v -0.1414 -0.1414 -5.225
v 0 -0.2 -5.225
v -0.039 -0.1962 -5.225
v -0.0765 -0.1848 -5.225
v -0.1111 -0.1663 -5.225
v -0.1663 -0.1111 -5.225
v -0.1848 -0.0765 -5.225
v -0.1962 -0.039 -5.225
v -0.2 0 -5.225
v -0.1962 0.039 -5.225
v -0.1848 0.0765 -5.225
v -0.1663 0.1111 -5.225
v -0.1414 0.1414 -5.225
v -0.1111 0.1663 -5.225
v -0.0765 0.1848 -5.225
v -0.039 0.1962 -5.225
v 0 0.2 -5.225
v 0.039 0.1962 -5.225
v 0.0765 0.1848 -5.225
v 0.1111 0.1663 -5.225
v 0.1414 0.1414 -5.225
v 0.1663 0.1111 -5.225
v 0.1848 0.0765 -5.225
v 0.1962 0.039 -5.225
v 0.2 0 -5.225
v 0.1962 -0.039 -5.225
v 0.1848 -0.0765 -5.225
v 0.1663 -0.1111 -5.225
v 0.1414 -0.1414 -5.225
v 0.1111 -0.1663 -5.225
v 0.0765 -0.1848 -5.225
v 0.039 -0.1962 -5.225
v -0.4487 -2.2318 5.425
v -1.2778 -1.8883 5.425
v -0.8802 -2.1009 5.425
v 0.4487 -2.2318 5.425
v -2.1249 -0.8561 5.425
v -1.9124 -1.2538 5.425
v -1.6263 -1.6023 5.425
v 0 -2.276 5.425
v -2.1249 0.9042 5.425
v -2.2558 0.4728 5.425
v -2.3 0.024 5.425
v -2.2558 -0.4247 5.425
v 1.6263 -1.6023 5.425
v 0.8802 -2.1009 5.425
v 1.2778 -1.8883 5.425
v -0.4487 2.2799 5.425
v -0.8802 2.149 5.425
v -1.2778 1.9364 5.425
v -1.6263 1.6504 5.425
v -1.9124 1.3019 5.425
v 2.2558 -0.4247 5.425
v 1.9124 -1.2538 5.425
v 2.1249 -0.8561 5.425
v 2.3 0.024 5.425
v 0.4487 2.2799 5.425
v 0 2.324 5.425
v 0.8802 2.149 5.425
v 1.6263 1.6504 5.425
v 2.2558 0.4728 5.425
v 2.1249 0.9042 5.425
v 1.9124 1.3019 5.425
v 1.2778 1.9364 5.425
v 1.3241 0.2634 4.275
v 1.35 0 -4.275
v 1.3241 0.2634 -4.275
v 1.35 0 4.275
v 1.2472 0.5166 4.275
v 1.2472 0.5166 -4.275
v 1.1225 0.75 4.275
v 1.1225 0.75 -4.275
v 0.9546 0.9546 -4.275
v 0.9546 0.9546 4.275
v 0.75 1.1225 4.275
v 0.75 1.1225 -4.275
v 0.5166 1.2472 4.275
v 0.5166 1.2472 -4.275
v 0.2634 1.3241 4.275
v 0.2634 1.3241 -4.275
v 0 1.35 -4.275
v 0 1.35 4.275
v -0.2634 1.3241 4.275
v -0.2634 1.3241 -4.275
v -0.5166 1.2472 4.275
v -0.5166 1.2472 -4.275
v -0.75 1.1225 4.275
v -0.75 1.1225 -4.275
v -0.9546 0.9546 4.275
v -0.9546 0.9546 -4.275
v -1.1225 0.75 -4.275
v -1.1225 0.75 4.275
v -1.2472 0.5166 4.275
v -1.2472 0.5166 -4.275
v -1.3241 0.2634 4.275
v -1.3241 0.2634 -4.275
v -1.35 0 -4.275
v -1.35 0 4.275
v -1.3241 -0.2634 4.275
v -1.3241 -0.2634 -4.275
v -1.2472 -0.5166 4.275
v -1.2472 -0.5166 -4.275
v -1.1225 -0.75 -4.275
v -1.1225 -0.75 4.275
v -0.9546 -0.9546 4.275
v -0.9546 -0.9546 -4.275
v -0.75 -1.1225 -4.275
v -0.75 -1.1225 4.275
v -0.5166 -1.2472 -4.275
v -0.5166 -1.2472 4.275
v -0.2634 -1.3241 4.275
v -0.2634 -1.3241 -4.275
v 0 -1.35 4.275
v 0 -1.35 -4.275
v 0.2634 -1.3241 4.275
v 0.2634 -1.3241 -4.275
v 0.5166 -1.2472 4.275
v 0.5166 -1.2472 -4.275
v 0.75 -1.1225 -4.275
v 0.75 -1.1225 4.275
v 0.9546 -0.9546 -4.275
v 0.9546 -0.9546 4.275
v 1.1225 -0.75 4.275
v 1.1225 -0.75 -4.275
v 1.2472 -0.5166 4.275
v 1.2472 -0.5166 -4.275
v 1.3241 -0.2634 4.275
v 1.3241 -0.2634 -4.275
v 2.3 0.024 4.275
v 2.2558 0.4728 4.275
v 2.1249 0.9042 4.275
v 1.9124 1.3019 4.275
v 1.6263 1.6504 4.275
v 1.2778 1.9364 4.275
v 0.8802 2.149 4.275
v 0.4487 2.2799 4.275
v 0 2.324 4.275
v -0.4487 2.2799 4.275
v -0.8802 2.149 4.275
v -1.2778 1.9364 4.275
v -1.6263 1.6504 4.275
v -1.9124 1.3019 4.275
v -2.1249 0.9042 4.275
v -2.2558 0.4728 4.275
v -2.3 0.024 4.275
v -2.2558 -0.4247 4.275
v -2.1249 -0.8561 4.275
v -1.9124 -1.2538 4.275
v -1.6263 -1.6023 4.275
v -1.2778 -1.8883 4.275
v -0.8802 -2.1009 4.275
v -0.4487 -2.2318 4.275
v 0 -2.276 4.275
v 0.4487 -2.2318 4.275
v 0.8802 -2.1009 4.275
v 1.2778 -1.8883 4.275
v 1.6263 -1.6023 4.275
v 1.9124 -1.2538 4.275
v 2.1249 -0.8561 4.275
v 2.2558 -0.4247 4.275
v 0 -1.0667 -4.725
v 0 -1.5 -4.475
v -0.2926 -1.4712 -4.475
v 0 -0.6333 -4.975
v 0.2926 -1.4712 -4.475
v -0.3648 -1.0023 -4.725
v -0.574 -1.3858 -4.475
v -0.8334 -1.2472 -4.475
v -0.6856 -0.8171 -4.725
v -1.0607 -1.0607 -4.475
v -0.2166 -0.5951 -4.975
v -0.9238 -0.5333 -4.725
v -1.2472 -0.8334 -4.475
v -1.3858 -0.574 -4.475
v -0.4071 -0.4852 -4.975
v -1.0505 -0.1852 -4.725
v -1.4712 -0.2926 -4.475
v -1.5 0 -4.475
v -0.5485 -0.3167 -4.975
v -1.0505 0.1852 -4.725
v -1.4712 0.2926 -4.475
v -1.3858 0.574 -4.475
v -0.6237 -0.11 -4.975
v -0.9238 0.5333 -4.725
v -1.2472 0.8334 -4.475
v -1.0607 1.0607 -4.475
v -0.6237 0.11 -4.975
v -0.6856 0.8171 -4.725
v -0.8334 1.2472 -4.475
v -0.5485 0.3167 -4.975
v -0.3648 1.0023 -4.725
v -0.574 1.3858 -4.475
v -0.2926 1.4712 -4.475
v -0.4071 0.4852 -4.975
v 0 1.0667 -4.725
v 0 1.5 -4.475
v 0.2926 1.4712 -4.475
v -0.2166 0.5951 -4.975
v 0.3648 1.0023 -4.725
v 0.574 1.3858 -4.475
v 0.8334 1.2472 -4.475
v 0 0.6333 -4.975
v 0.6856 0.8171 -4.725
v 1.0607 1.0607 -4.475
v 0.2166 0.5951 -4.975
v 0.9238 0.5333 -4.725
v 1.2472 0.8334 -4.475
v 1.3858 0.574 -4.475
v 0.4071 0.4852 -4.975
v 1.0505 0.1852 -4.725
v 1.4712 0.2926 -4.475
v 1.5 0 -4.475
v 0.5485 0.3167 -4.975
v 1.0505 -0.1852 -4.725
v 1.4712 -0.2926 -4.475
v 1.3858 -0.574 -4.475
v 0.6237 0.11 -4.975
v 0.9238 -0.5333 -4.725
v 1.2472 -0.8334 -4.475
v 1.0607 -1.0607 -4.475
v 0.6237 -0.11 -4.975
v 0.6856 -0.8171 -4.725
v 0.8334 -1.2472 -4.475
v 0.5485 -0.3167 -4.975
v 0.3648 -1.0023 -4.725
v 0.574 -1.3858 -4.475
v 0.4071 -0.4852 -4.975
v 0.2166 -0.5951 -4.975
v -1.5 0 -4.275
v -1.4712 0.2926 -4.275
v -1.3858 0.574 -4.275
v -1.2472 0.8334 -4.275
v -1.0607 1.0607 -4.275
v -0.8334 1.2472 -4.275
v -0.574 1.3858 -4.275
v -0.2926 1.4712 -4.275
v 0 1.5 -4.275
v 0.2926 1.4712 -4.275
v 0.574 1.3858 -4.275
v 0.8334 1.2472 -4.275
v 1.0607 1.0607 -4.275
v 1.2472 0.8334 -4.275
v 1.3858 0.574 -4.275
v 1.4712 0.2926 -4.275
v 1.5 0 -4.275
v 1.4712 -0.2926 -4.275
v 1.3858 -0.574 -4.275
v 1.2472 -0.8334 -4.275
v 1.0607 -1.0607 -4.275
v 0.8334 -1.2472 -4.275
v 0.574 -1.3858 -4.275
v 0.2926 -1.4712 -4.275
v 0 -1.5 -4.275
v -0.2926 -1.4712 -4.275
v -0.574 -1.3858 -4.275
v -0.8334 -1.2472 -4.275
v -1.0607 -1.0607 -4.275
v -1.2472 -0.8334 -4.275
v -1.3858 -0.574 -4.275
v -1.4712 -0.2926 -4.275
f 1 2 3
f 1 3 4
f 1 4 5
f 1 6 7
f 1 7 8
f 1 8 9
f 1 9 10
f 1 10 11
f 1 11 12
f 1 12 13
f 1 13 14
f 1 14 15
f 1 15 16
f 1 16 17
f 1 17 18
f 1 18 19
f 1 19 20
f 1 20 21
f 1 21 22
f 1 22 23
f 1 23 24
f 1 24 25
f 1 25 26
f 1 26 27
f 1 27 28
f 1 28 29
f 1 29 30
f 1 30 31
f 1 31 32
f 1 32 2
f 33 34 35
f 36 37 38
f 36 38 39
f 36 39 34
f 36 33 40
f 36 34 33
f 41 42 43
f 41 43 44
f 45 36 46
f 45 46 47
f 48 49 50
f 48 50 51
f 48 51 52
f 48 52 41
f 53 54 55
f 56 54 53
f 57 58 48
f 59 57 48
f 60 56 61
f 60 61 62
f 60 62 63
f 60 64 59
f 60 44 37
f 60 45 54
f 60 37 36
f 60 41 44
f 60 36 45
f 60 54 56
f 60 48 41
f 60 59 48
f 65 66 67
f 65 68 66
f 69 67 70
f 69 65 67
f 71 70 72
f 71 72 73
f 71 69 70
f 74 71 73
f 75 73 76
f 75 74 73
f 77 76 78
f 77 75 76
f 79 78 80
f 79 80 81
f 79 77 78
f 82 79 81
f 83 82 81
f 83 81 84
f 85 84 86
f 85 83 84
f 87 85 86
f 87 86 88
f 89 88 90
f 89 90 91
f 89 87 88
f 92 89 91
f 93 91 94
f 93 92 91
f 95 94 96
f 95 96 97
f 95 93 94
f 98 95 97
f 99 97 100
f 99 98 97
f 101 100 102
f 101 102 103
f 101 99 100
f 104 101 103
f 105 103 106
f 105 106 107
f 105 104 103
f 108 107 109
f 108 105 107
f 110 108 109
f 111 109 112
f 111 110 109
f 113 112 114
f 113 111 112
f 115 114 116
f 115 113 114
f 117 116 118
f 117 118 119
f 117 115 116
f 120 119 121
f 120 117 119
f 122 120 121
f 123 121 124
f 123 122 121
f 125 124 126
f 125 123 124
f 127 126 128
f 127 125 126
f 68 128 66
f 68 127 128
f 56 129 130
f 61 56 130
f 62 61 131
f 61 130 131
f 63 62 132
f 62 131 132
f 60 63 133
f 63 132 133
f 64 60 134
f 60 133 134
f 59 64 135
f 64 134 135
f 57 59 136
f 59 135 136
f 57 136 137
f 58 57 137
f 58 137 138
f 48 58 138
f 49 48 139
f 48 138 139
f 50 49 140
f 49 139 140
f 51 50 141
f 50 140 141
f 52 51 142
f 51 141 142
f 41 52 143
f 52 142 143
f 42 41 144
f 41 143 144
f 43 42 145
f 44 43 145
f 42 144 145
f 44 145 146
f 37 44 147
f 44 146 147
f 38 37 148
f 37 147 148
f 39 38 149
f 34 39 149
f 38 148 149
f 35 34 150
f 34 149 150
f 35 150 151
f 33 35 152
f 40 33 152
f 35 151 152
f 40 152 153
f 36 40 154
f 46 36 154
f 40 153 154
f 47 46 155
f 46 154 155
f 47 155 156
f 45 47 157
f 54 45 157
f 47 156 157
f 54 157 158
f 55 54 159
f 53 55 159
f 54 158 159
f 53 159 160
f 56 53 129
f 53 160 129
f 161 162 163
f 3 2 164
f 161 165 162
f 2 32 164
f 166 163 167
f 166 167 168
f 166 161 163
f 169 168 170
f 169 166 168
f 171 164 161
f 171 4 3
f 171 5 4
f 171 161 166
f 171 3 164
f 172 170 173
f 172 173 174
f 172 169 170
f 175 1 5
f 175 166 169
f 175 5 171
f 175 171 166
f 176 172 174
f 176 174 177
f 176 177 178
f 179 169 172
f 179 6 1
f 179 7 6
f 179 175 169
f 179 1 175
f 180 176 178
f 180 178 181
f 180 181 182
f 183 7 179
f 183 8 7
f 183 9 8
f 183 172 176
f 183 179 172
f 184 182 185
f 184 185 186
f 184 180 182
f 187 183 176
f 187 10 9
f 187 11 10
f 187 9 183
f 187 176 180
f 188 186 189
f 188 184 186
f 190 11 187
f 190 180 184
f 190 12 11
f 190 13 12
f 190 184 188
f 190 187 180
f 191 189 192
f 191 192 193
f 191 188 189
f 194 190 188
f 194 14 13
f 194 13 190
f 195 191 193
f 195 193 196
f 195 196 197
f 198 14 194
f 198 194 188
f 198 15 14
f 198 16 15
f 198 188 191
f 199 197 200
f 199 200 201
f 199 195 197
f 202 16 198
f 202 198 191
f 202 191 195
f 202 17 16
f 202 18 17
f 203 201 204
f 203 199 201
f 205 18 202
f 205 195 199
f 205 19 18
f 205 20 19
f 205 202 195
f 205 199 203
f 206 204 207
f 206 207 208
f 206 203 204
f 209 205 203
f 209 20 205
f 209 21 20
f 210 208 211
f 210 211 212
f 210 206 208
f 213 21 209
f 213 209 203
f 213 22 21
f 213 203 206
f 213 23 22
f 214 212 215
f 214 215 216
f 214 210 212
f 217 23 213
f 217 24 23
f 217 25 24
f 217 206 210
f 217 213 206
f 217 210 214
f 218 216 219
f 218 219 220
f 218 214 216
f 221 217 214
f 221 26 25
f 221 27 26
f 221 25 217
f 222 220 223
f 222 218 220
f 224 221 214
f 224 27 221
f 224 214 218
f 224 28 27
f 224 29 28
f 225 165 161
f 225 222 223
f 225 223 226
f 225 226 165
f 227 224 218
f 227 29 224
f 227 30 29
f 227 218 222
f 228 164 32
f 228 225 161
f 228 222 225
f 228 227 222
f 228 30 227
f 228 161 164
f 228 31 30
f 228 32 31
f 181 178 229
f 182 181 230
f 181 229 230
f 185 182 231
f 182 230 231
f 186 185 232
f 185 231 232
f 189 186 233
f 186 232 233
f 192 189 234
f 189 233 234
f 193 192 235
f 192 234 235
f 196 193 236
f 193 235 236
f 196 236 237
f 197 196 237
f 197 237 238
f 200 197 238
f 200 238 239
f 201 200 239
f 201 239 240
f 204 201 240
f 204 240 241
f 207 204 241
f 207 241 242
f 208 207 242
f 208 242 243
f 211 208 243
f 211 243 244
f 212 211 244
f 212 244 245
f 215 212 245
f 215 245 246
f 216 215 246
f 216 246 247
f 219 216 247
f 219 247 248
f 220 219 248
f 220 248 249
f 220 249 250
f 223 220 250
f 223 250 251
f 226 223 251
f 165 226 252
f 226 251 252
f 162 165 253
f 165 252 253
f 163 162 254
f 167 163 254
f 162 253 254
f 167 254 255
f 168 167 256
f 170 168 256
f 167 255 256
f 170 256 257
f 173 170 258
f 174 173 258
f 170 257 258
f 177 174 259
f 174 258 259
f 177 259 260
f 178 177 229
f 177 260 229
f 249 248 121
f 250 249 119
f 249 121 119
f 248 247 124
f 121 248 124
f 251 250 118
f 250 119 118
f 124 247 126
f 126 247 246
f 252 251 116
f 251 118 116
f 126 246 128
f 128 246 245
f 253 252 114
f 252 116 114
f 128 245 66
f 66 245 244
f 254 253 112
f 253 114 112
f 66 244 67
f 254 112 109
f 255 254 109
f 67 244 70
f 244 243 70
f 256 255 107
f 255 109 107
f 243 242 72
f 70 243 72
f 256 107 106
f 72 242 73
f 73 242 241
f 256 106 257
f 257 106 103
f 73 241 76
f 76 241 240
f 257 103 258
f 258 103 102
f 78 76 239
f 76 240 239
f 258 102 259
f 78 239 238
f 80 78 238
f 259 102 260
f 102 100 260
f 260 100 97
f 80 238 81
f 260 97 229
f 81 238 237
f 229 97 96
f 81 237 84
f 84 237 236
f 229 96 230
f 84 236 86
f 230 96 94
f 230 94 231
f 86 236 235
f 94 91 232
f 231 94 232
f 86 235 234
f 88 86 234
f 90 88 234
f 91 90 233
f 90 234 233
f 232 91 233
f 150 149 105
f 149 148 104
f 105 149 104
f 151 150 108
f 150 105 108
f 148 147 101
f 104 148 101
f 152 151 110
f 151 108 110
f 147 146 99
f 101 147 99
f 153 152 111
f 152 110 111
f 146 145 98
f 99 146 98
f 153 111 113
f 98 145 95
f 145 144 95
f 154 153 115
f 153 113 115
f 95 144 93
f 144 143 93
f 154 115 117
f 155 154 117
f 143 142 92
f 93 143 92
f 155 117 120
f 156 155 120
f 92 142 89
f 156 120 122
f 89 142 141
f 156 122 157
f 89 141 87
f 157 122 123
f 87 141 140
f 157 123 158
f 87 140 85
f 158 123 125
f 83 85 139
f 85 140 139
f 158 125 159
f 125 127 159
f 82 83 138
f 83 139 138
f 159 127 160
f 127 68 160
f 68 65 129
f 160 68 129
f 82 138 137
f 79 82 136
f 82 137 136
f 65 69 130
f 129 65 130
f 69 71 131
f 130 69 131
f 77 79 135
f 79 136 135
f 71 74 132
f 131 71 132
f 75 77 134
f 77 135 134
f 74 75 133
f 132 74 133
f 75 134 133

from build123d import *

# Parameters (mm, degrees)
SKETCH1_R           = 1.35
BOSS_EXTRUDE1_DEPTH = 4.275
SKETCH2_R           = 2.3
BOSS_EXTRUDE2_DEPTH = 1.15
SKETCH3_R           = 1.5
BOSS_EXTRUDE3_DEPTH = 1.15


with BuildPart() as part:
    # Sketch1 → Boss-Extrude1 (new, symmetric)
    with BuildSketch(Plane.XY):
        Circle(SKETCH1_R)
    extrude(amount=BOSS_EXTRUDE1_DEPTH, both=True)

    # Sketch2 → Boss-Extrude2 (add)
    with BuildSketch(Plane.XY.offset(4.275)):
        with Locations((0, 0.024044425)):
            Circle(SKETCH2_R)
    extrude(amount=BOSS_EXTRUDE2_DEPTH)

    # Sketch3 → Boss-Extrude3 (add)
    with BuildSketch(Plane(origin=(0, 0, -4.275), x_dir=(-1, 0, 0), z_dir=(0, 0, -1))):
        Circle(SKETCH3_R)
    extrude(amount=BOSS_EXTRUDE3_DEPTH)

    # Sketch4 → Cut-Revolve1 (revolve, cut)
    with BuildSketch(Plane(origin=(0, 0, 0), x_dir=(0, 0, -1), z_dir=(1, 0, 0)), mode=Mode.PRIVATE) as cut_revolve1_sk:
        Polygon((5.225, 0.2), (5.225, 0), (5.425, 0), (5.425, 1.5), (4.475, 1.5), align=None)
    revolve(cut_revolve1_sk.sketch.rotate(Axis((0, 0, -4.275), (0, 0, -1)), 180), axis=Axis((0, 0, -4.275), (0, 0, -1)), mode=Mode.SUBTRACT)


solid = part.part
